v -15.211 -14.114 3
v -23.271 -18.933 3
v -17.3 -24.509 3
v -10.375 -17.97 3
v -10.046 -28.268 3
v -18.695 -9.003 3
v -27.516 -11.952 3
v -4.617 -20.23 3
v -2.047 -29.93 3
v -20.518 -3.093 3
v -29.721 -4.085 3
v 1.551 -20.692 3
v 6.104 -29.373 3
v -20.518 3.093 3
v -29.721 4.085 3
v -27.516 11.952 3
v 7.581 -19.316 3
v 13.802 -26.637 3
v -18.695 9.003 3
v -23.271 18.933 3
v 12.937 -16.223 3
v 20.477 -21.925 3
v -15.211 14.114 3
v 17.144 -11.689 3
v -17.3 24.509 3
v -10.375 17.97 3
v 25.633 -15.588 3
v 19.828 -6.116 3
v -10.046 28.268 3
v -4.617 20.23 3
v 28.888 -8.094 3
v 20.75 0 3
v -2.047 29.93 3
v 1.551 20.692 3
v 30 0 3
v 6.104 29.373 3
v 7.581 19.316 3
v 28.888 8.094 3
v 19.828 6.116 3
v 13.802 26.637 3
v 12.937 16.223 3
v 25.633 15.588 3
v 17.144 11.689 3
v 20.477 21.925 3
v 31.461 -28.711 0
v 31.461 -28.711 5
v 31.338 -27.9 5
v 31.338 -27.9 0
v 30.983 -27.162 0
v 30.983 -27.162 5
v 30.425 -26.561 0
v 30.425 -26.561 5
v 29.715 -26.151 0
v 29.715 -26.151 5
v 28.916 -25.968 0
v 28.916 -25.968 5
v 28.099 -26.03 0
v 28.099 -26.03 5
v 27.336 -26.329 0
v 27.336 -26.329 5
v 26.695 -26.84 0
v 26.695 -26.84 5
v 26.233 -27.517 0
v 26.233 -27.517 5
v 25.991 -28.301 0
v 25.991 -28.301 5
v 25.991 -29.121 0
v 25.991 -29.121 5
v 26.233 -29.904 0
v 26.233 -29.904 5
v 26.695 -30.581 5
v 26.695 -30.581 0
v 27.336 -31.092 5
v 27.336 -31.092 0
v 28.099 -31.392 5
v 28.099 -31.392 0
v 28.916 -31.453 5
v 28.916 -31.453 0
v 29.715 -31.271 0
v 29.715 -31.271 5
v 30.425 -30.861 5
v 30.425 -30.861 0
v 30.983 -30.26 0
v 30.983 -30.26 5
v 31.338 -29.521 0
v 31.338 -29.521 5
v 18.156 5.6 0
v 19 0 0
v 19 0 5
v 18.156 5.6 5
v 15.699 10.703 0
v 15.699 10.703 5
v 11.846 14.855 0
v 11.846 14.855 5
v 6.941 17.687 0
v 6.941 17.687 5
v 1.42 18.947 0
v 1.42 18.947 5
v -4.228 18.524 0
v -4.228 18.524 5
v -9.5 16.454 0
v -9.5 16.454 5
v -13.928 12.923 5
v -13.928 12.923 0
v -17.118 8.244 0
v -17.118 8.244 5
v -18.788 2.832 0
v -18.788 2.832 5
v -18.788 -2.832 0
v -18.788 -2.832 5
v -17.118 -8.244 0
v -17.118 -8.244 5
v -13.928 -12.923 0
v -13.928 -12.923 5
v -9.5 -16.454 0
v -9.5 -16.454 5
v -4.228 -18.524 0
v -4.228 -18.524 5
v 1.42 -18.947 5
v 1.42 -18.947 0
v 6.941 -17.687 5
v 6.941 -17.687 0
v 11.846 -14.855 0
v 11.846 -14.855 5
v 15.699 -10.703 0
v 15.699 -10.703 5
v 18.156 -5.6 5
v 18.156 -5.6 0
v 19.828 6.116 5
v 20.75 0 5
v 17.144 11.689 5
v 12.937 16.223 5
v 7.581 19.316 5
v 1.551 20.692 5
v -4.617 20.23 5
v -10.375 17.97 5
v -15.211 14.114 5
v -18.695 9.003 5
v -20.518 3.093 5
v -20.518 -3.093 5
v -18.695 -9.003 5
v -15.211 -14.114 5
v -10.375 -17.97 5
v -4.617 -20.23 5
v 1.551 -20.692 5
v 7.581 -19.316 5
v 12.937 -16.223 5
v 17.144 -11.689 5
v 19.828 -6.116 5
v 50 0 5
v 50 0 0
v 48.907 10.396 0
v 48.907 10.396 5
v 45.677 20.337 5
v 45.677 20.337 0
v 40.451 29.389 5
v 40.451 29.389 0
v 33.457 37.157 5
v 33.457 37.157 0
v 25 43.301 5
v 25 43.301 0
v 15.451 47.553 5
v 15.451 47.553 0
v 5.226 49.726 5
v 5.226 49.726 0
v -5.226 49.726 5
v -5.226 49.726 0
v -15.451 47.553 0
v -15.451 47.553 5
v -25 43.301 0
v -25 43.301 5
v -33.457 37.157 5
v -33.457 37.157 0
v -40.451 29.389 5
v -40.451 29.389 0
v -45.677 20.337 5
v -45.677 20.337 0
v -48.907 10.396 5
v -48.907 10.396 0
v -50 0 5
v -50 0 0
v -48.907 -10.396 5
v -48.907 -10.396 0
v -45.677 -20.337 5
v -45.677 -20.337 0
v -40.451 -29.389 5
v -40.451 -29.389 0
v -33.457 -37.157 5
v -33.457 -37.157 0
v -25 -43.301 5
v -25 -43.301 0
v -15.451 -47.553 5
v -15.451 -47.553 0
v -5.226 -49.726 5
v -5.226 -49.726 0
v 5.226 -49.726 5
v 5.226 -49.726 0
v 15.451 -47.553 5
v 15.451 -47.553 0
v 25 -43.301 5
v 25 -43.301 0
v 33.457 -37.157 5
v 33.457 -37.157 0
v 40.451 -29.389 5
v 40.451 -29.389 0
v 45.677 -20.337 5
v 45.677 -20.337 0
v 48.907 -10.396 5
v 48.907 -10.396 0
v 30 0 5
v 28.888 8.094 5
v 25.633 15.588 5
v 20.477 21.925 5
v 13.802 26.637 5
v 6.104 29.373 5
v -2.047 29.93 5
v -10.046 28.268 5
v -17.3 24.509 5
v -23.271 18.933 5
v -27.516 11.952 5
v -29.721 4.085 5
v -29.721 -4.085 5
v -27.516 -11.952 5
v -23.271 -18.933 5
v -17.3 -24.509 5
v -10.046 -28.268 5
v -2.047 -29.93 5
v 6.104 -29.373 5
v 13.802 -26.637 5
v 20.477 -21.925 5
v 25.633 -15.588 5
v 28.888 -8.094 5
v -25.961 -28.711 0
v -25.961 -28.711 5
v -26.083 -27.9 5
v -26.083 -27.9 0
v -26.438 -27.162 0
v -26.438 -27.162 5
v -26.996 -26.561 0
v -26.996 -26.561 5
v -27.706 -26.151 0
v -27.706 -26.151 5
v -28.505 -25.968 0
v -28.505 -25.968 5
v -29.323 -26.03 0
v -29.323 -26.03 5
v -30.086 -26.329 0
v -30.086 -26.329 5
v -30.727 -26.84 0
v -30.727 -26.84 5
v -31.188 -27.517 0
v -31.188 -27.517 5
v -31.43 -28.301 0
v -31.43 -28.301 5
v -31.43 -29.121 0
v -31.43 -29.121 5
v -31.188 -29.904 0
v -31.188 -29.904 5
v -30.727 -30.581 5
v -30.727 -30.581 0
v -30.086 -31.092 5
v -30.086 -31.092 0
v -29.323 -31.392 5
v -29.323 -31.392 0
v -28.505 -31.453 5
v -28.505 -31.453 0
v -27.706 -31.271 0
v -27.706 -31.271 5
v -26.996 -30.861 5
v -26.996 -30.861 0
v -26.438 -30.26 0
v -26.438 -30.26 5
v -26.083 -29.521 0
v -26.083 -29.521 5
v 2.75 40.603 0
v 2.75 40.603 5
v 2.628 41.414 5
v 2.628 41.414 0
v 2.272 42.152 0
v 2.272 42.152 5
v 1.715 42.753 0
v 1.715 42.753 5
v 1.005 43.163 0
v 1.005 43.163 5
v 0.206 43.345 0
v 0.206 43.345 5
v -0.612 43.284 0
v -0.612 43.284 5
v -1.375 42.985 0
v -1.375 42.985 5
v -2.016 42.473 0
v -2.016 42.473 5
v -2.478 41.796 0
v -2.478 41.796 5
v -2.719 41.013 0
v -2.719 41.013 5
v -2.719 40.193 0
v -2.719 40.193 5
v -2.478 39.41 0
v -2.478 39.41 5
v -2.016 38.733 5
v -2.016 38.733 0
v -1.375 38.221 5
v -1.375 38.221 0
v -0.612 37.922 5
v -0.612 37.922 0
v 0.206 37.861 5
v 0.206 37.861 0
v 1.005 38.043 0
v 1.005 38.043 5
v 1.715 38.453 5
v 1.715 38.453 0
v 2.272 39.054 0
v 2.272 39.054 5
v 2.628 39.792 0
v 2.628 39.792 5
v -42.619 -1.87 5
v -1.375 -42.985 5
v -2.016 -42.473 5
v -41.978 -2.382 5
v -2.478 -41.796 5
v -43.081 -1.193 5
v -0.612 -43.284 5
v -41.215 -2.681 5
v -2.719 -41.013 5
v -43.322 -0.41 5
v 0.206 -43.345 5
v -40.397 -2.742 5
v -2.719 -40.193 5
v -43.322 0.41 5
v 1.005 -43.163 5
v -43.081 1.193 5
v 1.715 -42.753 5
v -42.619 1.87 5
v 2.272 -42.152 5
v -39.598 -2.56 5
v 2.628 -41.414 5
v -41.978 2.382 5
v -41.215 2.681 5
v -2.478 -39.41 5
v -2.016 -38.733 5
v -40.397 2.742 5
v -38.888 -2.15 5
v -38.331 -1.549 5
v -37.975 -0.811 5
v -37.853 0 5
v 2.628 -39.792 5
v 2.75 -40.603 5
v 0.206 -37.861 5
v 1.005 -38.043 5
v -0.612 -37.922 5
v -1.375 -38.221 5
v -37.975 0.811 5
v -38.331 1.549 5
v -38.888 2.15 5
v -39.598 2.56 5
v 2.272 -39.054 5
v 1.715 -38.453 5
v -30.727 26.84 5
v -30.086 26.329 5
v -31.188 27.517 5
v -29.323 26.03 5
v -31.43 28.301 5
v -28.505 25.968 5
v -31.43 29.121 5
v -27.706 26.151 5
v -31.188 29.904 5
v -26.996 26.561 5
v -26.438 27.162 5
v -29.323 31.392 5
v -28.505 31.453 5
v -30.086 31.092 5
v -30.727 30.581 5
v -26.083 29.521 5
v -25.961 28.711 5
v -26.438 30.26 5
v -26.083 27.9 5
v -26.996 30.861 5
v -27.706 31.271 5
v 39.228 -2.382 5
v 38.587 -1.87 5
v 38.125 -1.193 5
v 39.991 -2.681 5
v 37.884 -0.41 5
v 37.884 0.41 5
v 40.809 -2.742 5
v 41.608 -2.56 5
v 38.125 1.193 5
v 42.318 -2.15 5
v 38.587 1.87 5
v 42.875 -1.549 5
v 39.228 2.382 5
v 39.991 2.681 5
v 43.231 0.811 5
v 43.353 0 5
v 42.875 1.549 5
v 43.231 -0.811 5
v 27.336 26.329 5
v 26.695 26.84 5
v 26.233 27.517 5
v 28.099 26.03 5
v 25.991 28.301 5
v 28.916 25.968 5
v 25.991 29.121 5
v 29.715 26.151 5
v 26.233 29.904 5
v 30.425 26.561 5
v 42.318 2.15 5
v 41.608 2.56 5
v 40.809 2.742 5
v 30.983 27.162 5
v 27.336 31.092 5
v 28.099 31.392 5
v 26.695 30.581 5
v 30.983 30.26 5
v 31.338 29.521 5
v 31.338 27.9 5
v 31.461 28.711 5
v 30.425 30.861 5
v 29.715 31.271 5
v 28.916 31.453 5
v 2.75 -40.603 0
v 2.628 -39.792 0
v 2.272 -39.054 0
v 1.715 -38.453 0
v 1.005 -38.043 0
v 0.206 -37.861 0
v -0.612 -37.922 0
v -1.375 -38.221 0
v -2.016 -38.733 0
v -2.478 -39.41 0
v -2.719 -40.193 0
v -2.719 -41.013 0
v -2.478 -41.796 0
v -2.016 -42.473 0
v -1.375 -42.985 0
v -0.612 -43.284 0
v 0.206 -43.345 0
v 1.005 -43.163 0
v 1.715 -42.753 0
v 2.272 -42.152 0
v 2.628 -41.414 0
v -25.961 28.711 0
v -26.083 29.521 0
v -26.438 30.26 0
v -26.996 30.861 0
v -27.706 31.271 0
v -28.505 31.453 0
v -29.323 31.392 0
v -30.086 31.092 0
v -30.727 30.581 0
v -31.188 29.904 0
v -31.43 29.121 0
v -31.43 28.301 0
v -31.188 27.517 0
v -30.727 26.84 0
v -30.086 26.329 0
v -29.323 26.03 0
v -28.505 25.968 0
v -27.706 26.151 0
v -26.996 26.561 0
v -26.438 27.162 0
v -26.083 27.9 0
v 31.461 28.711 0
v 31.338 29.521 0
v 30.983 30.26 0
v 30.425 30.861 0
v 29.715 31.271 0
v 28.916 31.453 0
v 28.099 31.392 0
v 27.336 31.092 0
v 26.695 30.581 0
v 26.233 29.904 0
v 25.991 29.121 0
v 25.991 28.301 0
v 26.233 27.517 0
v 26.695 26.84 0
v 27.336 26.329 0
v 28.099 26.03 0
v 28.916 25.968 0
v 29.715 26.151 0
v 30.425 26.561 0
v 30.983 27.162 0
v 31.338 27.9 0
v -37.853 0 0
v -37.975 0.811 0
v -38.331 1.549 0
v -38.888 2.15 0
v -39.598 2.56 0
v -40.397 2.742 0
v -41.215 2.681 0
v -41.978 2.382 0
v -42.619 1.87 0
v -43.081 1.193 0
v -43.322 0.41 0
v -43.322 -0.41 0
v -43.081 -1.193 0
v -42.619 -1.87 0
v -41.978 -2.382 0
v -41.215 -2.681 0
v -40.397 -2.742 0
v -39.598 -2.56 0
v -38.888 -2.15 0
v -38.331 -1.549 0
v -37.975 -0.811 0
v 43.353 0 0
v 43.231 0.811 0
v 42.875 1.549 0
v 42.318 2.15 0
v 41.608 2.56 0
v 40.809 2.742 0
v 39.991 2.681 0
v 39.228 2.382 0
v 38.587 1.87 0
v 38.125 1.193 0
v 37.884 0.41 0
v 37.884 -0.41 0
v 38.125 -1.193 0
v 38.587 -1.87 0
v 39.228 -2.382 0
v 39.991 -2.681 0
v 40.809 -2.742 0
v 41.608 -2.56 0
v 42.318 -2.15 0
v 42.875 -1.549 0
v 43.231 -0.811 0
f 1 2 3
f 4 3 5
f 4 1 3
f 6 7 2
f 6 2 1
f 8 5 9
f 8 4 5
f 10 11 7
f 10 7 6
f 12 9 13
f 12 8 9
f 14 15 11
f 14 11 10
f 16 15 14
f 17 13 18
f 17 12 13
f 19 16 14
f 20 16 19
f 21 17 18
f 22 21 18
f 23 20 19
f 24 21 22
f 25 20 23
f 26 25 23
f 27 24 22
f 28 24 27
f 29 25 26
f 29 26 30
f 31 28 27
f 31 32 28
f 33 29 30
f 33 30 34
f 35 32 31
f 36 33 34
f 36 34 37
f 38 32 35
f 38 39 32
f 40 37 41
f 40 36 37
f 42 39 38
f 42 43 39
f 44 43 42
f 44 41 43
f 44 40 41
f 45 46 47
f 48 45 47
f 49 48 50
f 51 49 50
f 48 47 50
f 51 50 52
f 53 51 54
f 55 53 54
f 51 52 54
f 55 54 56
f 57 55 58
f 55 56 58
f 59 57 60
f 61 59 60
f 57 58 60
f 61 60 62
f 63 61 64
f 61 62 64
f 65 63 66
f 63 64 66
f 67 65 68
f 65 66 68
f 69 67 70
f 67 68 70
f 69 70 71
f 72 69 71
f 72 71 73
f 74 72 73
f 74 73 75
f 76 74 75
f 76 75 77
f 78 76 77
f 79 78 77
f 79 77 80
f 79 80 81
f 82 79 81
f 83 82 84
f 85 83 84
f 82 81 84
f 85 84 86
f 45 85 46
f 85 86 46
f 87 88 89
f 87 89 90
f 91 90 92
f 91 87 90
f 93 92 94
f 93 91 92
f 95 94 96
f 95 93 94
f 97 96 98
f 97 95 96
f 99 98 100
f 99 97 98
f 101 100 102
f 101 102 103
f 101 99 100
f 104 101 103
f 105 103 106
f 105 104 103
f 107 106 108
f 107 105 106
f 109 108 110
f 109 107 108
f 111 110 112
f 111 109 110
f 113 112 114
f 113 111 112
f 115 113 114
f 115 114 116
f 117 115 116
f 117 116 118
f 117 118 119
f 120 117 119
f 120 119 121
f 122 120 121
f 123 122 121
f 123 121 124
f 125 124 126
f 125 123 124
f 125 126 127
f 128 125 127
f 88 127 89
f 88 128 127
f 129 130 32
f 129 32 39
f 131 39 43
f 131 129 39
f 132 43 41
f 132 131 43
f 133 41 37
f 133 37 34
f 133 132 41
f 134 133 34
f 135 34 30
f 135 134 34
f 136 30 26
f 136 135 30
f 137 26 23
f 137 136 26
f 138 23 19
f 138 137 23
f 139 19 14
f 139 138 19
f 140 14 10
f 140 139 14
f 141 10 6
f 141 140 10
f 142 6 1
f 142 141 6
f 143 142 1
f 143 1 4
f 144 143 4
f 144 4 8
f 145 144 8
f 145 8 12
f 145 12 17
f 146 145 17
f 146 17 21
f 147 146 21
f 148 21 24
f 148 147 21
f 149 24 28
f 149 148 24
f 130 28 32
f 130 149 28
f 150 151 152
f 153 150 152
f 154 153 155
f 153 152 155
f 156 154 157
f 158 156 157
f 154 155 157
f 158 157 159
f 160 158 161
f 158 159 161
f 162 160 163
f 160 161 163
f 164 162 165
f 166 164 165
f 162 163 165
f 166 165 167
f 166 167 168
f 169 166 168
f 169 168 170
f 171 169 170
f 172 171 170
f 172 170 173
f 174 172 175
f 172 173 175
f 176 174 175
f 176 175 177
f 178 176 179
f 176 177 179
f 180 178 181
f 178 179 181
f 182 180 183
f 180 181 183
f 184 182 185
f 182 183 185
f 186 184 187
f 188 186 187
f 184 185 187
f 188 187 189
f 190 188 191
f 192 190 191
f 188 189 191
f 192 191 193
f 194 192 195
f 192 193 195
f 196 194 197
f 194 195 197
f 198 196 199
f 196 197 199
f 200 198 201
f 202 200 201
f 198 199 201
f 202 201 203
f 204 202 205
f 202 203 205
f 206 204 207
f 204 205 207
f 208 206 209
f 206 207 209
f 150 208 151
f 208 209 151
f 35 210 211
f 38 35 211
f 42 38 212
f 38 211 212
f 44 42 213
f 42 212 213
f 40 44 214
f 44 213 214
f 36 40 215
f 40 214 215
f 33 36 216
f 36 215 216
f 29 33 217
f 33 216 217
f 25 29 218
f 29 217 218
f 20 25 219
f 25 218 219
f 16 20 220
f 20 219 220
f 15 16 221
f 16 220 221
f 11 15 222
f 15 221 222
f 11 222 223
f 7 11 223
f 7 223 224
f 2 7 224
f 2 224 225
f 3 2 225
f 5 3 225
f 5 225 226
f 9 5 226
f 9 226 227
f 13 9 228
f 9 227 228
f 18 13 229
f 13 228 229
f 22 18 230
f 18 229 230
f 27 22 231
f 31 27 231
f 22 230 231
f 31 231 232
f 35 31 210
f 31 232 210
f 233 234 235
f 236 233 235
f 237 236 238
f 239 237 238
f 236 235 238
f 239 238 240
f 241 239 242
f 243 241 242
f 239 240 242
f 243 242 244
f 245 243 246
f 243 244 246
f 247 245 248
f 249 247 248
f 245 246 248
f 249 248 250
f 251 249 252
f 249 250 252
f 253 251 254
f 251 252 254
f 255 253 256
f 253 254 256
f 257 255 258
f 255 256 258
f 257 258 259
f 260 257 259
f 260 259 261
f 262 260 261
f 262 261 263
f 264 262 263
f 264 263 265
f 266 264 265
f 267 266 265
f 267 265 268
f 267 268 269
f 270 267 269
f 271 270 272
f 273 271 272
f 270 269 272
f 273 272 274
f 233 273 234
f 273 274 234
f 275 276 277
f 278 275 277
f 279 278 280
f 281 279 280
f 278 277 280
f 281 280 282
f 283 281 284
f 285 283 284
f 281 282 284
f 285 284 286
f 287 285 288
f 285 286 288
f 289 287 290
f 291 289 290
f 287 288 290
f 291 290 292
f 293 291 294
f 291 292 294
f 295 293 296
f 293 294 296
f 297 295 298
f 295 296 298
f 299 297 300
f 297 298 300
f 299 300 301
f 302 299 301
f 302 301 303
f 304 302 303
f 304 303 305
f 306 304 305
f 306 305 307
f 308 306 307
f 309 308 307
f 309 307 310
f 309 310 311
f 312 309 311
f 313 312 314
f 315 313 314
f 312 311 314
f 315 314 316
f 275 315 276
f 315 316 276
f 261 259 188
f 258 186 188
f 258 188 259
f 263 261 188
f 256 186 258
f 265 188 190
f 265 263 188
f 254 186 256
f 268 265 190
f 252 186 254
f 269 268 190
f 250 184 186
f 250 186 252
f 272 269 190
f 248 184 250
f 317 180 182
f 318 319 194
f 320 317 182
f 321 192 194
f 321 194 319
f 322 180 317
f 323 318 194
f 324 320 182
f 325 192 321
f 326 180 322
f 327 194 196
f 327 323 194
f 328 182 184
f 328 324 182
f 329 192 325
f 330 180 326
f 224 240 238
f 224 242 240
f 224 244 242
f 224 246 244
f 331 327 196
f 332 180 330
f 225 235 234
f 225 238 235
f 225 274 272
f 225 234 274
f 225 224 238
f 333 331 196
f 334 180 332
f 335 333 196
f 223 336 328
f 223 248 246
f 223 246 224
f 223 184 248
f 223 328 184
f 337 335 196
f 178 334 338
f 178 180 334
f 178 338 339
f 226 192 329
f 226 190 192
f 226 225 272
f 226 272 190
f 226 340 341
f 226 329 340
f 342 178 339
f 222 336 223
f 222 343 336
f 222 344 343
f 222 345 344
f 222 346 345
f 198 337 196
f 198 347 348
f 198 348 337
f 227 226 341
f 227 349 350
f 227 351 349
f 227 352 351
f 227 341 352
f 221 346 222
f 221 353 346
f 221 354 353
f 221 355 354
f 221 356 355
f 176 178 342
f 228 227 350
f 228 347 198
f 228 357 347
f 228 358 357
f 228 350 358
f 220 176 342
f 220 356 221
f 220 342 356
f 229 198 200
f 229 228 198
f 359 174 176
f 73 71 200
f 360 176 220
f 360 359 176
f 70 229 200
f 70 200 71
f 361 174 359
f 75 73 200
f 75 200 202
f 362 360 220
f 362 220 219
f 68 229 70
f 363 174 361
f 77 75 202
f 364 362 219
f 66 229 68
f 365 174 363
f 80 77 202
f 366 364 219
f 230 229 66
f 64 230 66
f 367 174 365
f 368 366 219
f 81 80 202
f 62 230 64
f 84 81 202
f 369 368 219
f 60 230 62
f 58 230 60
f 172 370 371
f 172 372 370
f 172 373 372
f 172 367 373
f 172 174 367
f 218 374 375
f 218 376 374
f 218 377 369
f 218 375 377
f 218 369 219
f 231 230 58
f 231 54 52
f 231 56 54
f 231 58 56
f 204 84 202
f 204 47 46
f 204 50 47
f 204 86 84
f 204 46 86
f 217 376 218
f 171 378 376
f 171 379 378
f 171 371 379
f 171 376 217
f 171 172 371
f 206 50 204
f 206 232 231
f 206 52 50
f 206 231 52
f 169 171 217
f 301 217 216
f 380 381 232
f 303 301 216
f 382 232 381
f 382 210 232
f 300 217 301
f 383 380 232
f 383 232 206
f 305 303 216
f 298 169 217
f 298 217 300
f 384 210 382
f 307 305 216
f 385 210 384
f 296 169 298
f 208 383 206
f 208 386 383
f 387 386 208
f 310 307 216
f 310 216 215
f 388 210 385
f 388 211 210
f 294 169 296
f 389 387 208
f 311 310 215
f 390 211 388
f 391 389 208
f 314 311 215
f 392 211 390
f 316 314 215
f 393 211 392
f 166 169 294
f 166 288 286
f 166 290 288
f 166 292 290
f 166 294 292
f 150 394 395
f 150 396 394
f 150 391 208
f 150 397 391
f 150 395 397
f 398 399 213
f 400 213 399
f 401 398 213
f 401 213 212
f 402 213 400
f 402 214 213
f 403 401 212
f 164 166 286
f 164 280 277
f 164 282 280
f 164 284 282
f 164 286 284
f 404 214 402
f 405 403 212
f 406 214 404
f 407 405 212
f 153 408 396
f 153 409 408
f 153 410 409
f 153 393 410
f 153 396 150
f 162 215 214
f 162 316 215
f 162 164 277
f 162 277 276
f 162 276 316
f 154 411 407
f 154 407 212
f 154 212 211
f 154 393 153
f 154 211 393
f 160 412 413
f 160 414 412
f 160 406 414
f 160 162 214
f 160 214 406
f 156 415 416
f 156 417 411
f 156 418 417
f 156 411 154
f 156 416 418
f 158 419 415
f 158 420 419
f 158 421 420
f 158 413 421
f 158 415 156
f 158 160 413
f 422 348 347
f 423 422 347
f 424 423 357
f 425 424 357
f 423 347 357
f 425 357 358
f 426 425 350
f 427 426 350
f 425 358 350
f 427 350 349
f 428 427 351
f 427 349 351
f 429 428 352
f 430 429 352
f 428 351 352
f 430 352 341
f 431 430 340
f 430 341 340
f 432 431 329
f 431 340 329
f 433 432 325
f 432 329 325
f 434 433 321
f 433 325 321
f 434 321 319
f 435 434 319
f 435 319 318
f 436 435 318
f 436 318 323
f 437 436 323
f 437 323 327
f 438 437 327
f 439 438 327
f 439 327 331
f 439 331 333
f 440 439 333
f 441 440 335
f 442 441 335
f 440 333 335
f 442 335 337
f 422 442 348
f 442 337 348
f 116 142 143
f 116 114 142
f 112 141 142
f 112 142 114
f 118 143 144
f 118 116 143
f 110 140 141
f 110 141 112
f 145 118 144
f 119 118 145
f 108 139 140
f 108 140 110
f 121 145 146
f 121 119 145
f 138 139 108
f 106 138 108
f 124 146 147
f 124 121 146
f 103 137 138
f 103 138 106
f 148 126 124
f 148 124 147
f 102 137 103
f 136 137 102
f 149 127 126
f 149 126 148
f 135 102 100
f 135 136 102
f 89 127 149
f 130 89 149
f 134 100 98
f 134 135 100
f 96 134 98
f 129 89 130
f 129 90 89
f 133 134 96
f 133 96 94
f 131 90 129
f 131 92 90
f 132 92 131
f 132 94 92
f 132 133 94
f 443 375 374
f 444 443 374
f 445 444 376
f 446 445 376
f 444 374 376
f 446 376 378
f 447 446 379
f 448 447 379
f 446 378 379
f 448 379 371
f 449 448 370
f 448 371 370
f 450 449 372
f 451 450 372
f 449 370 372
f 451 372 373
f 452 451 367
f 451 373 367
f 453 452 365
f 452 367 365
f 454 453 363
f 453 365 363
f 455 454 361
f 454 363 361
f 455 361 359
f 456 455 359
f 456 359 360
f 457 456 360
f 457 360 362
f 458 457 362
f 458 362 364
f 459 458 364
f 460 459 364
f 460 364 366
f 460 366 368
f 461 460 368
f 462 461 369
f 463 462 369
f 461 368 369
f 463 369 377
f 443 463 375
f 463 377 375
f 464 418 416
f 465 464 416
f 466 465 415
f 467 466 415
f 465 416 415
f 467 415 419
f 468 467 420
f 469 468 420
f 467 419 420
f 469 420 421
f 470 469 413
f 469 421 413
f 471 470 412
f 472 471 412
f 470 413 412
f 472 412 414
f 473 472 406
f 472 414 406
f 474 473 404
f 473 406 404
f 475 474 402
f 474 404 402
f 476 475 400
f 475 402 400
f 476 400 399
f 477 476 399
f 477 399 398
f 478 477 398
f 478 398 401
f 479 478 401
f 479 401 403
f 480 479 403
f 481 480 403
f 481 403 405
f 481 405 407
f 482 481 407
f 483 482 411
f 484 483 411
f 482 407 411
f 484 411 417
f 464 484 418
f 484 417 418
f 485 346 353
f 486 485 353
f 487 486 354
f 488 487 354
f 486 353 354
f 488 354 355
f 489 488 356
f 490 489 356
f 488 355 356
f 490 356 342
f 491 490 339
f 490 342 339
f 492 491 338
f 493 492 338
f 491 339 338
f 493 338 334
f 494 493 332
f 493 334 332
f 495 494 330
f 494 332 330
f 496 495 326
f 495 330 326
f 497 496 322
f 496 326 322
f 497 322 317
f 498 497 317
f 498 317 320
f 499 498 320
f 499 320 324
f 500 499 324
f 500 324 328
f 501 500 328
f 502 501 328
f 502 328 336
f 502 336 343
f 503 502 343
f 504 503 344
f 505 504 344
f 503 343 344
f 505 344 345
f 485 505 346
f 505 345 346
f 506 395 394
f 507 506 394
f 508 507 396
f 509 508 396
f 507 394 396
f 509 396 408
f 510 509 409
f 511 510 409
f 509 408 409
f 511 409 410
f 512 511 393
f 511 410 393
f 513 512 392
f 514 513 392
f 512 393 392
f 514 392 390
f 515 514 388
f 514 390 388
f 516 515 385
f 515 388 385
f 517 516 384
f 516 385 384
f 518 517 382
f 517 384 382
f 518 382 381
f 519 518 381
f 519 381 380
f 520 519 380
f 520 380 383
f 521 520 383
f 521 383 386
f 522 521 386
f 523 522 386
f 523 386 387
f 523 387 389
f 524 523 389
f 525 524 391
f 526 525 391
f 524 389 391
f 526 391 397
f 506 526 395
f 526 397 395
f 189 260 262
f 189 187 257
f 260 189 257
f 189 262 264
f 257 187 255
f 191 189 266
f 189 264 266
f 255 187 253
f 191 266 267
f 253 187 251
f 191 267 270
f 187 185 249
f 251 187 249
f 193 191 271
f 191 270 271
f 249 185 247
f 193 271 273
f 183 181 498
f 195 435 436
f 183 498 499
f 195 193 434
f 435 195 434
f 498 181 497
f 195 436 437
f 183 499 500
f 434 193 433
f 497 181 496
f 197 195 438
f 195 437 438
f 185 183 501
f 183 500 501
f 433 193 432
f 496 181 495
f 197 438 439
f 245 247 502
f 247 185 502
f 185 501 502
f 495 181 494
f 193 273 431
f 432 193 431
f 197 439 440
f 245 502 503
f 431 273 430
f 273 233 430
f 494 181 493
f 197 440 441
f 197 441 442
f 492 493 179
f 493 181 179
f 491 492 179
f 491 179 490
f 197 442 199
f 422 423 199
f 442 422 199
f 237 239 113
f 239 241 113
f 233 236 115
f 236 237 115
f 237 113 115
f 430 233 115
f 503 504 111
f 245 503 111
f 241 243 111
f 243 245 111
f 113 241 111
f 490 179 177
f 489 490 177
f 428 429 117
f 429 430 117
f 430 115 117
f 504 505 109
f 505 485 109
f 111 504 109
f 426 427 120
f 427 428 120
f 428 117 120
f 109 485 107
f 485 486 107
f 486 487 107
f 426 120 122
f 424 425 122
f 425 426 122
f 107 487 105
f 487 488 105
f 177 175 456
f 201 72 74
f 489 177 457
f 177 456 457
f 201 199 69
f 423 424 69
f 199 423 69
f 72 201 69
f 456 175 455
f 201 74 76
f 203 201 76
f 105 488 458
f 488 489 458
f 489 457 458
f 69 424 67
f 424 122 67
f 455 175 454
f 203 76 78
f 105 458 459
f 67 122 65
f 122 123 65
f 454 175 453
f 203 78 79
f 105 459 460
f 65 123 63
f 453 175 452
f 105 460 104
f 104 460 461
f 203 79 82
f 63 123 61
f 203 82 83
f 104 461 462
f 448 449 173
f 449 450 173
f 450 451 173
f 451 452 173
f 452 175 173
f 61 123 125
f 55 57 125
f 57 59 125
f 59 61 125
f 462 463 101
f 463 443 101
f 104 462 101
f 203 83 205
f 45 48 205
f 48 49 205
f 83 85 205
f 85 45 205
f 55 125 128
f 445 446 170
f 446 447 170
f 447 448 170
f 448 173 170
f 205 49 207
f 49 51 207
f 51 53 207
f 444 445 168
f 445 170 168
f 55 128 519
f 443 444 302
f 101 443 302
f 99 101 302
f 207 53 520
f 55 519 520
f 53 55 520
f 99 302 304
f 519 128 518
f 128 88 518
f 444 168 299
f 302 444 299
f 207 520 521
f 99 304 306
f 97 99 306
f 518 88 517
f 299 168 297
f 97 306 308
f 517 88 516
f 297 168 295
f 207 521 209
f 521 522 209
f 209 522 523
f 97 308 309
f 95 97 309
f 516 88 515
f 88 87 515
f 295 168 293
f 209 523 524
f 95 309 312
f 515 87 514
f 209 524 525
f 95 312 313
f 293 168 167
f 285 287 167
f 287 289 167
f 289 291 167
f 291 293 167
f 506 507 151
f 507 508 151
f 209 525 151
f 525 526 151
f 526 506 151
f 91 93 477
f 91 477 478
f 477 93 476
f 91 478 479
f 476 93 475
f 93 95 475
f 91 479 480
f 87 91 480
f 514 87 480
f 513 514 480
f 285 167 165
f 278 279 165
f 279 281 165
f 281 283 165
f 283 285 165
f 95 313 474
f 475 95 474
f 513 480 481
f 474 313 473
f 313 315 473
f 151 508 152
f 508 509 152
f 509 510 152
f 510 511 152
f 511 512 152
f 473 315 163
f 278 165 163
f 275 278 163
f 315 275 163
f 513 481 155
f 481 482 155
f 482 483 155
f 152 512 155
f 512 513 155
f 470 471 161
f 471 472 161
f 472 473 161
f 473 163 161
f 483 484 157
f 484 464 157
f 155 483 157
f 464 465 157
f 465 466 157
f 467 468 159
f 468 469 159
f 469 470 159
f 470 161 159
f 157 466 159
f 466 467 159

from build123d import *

# Parameters (mm, degrees)
CROQUIS1_R              = 50
CROQUIS1_R_2            = 19
SALIENTE_EXTRUIR1_DEPTH = 5
CROQUIS4_R              = 30
CROQUIS4_R_2            = 20.75
CORTAR_EXTRUIR1_DEPTH   = 2
CROQUIS5_R              = 2.75
CORTAR_EXTRUIR2_DEPTH   = 5


with BuildPart() as part:
    # Croquis1 → Saliente-Extruir1 (new body)
    with BuildSketch(Plane.XY):
        Circle(CROQUIS1_R)
        Circle(CROQUIS1_R_2, mode=Mode.SUBTRACT)
    extrude(amount=SALIENTE_EXTRUIR1_DEPTH)

    # Croquis4 → Cortar-Extruir1 (cut)
    with BuildSketch(Plane.XY.offset(5)):
        Circle(CROQUIS4_R)
        Circle(CROQUIS4_R_2, mode=Mode.SUBTRACT)
    extrude(amount=-CORTAR_EXTRUIR1_DEPTH, mode=Mode.SUBTRACT)

    # Croquis5 → Cortar-Extruir2 (cut)
    with BuildSketch(Plane.XY.offset(5)):
        with Locations((40.602997929, 0)):
            Circle(CROQUIS5_R)
        with Locations((28.710655172, -28.710655172)):
            Circle(CROQUIS5_R)
        with Locations((0, -40.602997929)):
            Circle(CROQUIS5_R)
        with Locations((-28.710655172, -28.710655172)):
            Circle(CROQUIS5_R)
        with Locations((-40.602997929, 0)):
            Circle(CROQUIS5_R)
        with Locations((-28.710655172, 28.710655172)):
            Circle(CROQUIS5_R)
        with Locations((0, 40.602997929)):
            Circle(CROQUIS5_R)
        with Locations((28.710655172, 28.710655172)):
            Circle(CROQUIS5_R)
    extrude(amount=-CORTAR_EXTRUIR2_DEPTH, mode=Mode.SUBTRACT)


solid = part.part
